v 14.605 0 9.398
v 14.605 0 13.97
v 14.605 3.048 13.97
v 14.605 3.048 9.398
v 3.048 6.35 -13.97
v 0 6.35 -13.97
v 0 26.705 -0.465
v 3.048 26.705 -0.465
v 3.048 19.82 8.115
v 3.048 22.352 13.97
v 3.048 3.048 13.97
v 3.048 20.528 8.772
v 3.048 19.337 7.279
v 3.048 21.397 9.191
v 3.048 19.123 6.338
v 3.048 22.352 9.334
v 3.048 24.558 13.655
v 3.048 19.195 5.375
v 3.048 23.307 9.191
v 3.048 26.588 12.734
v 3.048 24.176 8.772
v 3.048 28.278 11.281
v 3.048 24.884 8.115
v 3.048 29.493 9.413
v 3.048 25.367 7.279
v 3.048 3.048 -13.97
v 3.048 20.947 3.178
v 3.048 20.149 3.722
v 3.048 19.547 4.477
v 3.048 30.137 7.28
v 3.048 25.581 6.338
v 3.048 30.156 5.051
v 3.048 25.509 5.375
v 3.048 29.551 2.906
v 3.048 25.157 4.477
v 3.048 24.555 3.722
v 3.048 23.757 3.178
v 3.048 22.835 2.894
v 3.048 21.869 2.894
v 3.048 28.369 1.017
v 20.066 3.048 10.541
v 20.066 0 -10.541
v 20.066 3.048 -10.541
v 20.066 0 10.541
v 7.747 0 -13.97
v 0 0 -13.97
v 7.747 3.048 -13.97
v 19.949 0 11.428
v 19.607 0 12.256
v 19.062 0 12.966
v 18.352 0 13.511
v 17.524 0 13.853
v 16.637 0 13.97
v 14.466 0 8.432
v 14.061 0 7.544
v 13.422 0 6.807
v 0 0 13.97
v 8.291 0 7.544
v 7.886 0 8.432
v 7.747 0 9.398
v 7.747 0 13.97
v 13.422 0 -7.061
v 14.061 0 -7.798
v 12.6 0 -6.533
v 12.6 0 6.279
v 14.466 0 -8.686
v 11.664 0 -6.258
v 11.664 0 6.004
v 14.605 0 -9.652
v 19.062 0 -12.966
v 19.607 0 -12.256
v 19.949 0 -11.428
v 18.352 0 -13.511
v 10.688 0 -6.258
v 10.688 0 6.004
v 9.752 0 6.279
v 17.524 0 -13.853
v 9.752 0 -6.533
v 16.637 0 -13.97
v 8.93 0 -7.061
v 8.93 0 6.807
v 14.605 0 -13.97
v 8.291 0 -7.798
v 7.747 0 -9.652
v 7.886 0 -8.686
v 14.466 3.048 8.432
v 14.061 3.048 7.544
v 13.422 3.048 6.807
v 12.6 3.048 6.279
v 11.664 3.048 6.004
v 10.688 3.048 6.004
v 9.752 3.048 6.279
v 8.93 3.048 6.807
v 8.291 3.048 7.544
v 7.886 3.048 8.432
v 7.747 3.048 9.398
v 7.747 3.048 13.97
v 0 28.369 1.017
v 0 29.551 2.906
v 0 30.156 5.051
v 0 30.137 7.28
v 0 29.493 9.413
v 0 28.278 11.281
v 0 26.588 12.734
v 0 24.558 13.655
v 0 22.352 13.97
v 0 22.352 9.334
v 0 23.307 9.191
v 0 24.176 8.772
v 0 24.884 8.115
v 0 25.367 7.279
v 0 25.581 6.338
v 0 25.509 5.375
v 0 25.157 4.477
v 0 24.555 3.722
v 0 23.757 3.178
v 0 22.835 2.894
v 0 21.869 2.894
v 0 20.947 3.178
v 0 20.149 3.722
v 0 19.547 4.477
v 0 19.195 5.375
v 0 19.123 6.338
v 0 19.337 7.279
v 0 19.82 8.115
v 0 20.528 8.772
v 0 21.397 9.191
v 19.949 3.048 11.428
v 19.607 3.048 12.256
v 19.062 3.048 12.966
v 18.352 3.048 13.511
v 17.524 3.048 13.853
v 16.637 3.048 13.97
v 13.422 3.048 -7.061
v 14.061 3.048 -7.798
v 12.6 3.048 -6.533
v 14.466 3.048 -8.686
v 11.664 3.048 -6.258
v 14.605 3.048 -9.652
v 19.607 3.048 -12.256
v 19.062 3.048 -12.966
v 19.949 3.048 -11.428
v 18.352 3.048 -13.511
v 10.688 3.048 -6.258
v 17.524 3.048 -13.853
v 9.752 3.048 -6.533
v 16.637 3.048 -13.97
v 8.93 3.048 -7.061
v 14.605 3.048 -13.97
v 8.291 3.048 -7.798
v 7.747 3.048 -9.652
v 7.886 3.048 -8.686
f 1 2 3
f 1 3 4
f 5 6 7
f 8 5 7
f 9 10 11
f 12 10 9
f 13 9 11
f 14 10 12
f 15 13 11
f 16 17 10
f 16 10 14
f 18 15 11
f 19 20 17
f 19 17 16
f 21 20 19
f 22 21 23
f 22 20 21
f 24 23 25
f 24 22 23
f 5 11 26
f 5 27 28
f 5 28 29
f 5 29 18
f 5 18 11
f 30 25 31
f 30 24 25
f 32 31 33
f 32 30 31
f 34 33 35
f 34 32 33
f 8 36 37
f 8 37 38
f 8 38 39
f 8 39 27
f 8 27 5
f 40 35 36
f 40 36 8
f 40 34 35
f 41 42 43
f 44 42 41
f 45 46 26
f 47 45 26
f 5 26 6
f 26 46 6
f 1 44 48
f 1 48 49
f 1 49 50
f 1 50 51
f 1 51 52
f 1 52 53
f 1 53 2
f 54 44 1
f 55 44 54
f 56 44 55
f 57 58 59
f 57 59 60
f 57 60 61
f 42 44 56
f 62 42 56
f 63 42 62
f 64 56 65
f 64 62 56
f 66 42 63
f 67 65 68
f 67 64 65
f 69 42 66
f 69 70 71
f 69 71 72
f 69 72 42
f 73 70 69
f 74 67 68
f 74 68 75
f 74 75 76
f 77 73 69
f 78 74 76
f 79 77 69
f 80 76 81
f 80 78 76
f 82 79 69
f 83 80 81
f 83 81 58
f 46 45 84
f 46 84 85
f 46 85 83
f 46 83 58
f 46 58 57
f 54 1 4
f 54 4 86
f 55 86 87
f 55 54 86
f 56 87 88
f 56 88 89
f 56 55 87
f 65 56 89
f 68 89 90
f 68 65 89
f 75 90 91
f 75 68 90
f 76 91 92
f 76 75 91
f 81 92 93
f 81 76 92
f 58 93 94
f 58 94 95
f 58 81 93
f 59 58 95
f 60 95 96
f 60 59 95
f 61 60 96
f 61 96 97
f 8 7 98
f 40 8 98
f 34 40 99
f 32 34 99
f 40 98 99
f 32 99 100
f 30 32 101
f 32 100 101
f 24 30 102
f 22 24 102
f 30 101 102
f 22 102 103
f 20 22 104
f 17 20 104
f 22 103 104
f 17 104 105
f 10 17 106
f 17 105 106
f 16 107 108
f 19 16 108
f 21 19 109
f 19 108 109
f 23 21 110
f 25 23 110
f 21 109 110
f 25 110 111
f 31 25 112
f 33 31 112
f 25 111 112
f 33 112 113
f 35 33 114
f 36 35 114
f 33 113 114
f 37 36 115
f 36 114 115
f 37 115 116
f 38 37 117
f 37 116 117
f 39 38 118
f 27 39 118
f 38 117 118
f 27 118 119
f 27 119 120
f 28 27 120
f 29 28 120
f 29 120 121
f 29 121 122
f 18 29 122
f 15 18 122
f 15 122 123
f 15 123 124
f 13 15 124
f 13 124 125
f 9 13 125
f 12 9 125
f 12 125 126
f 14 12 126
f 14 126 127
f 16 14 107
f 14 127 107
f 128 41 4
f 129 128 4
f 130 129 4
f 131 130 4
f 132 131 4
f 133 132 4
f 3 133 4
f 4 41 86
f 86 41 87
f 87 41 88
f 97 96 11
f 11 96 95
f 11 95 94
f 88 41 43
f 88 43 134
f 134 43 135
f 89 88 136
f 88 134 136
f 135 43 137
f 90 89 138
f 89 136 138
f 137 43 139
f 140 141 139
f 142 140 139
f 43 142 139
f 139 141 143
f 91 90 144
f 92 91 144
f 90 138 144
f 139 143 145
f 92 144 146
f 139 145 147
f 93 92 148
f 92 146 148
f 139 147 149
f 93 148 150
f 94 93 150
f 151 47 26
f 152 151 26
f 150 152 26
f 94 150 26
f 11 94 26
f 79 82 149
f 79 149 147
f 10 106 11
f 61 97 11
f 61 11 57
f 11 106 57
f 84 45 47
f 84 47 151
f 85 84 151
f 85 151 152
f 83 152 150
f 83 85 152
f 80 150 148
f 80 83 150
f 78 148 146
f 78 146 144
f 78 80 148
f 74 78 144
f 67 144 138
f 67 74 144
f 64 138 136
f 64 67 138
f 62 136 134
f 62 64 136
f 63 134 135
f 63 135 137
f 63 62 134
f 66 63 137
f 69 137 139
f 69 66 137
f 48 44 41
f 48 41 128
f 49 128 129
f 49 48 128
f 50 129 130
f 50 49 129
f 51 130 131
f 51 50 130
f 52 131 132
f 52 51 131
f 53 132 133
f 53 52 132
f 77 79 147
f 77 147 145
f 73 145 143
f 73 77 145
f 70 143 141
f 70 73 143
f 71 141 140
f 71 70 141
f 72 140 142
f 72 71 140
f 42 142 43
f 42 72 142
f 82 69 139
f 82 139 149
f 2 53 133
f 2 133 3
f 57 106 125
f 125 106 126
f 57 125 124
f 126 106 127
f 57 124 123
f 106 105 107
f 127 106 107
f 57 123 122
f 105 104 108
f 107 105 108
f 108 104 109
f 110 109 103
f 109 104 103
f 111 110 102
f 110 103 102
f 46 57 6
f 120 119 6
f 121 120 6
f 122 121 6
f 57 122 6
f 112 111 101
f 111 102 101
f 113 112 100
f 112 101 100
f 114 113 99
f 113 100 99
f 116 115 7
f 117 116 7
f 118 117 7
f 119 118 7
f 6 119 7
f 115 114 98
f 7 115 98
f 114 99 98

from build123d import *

# Parameters (mm, degrees)
BASE_EXTRUDE_DEPTH = 3.048
SKETCH4_R          = 3.2385
REARRIB_DEPTH      = 3.048


with BuildPart() as part:
    # Sketch2 → Base-Extrude (new body)
    with BuildSketch(Plane(origin=(0, 0, 0), x_dir=(1, 0, 0), z_dir=(0, 1, 0))):
        with BuildLine():
            Line((0, 13.97), (7.747, 13.97))
            Line((7.747, 13.97), (7.747, 9.652))
            ThreePointArc((7.747, 9.652), (11.176, 6.223), (14.605, 9.652))
            Line((14.605, 9.652), (14.605, 13.97))
            Line((14.605, 13.97), (16.637, 13.97))
            ThreePointArc((16.637, 13.97), (19.061669153, 12.965669153), (20.066, 10.541))
            Line((20.066, 10.541), (20.066, -10.541))
            ThreePointArc((20.066, -10.541), (19.061669153, -12.965669153), (16.637, -13.97))
            Line((16.637, -13.97), (14.605, -13.97))
            Line((14.605, -13.97), (14.605, -9.398))
            ThreePointArc((14.605, -9.398), (11.176, -5.969), (7.747, -9.398))
            Line((7.747, -9.398), (7.747, -13.97))
            Line((7.747, -13.97), (0, -13.97))
            Line((0, -13.97), (0, 13.97))
        make_face()
    extrude(amount=BASE_EXTRUDE_DEPTH)

    # Sketch4 → RearRib (add)
    with BuildSketch(Plane.ZY):
        with BuildLine():
            Line((13.97, 22.352), (13.97, 0))
            Line((13.97, 0), (-13.97, 0))
            Line((-13.97, 0), (-13.97, 6.35))
            Line((-13.97, 6.35), (-0.465269586, 26.70511583))
            ThreePointArc((-0.465269586, 26.70511583), (8.369371866, 29.890677361), (13.97, 22.352))
        make_face()
        with Locations((6.096, 22.352)):
            Circle(SKETCH4_R, mode=Mode.SUBTRACT)
    extrude(amount=-REARRIB_DEPTH)


solid = part.part
